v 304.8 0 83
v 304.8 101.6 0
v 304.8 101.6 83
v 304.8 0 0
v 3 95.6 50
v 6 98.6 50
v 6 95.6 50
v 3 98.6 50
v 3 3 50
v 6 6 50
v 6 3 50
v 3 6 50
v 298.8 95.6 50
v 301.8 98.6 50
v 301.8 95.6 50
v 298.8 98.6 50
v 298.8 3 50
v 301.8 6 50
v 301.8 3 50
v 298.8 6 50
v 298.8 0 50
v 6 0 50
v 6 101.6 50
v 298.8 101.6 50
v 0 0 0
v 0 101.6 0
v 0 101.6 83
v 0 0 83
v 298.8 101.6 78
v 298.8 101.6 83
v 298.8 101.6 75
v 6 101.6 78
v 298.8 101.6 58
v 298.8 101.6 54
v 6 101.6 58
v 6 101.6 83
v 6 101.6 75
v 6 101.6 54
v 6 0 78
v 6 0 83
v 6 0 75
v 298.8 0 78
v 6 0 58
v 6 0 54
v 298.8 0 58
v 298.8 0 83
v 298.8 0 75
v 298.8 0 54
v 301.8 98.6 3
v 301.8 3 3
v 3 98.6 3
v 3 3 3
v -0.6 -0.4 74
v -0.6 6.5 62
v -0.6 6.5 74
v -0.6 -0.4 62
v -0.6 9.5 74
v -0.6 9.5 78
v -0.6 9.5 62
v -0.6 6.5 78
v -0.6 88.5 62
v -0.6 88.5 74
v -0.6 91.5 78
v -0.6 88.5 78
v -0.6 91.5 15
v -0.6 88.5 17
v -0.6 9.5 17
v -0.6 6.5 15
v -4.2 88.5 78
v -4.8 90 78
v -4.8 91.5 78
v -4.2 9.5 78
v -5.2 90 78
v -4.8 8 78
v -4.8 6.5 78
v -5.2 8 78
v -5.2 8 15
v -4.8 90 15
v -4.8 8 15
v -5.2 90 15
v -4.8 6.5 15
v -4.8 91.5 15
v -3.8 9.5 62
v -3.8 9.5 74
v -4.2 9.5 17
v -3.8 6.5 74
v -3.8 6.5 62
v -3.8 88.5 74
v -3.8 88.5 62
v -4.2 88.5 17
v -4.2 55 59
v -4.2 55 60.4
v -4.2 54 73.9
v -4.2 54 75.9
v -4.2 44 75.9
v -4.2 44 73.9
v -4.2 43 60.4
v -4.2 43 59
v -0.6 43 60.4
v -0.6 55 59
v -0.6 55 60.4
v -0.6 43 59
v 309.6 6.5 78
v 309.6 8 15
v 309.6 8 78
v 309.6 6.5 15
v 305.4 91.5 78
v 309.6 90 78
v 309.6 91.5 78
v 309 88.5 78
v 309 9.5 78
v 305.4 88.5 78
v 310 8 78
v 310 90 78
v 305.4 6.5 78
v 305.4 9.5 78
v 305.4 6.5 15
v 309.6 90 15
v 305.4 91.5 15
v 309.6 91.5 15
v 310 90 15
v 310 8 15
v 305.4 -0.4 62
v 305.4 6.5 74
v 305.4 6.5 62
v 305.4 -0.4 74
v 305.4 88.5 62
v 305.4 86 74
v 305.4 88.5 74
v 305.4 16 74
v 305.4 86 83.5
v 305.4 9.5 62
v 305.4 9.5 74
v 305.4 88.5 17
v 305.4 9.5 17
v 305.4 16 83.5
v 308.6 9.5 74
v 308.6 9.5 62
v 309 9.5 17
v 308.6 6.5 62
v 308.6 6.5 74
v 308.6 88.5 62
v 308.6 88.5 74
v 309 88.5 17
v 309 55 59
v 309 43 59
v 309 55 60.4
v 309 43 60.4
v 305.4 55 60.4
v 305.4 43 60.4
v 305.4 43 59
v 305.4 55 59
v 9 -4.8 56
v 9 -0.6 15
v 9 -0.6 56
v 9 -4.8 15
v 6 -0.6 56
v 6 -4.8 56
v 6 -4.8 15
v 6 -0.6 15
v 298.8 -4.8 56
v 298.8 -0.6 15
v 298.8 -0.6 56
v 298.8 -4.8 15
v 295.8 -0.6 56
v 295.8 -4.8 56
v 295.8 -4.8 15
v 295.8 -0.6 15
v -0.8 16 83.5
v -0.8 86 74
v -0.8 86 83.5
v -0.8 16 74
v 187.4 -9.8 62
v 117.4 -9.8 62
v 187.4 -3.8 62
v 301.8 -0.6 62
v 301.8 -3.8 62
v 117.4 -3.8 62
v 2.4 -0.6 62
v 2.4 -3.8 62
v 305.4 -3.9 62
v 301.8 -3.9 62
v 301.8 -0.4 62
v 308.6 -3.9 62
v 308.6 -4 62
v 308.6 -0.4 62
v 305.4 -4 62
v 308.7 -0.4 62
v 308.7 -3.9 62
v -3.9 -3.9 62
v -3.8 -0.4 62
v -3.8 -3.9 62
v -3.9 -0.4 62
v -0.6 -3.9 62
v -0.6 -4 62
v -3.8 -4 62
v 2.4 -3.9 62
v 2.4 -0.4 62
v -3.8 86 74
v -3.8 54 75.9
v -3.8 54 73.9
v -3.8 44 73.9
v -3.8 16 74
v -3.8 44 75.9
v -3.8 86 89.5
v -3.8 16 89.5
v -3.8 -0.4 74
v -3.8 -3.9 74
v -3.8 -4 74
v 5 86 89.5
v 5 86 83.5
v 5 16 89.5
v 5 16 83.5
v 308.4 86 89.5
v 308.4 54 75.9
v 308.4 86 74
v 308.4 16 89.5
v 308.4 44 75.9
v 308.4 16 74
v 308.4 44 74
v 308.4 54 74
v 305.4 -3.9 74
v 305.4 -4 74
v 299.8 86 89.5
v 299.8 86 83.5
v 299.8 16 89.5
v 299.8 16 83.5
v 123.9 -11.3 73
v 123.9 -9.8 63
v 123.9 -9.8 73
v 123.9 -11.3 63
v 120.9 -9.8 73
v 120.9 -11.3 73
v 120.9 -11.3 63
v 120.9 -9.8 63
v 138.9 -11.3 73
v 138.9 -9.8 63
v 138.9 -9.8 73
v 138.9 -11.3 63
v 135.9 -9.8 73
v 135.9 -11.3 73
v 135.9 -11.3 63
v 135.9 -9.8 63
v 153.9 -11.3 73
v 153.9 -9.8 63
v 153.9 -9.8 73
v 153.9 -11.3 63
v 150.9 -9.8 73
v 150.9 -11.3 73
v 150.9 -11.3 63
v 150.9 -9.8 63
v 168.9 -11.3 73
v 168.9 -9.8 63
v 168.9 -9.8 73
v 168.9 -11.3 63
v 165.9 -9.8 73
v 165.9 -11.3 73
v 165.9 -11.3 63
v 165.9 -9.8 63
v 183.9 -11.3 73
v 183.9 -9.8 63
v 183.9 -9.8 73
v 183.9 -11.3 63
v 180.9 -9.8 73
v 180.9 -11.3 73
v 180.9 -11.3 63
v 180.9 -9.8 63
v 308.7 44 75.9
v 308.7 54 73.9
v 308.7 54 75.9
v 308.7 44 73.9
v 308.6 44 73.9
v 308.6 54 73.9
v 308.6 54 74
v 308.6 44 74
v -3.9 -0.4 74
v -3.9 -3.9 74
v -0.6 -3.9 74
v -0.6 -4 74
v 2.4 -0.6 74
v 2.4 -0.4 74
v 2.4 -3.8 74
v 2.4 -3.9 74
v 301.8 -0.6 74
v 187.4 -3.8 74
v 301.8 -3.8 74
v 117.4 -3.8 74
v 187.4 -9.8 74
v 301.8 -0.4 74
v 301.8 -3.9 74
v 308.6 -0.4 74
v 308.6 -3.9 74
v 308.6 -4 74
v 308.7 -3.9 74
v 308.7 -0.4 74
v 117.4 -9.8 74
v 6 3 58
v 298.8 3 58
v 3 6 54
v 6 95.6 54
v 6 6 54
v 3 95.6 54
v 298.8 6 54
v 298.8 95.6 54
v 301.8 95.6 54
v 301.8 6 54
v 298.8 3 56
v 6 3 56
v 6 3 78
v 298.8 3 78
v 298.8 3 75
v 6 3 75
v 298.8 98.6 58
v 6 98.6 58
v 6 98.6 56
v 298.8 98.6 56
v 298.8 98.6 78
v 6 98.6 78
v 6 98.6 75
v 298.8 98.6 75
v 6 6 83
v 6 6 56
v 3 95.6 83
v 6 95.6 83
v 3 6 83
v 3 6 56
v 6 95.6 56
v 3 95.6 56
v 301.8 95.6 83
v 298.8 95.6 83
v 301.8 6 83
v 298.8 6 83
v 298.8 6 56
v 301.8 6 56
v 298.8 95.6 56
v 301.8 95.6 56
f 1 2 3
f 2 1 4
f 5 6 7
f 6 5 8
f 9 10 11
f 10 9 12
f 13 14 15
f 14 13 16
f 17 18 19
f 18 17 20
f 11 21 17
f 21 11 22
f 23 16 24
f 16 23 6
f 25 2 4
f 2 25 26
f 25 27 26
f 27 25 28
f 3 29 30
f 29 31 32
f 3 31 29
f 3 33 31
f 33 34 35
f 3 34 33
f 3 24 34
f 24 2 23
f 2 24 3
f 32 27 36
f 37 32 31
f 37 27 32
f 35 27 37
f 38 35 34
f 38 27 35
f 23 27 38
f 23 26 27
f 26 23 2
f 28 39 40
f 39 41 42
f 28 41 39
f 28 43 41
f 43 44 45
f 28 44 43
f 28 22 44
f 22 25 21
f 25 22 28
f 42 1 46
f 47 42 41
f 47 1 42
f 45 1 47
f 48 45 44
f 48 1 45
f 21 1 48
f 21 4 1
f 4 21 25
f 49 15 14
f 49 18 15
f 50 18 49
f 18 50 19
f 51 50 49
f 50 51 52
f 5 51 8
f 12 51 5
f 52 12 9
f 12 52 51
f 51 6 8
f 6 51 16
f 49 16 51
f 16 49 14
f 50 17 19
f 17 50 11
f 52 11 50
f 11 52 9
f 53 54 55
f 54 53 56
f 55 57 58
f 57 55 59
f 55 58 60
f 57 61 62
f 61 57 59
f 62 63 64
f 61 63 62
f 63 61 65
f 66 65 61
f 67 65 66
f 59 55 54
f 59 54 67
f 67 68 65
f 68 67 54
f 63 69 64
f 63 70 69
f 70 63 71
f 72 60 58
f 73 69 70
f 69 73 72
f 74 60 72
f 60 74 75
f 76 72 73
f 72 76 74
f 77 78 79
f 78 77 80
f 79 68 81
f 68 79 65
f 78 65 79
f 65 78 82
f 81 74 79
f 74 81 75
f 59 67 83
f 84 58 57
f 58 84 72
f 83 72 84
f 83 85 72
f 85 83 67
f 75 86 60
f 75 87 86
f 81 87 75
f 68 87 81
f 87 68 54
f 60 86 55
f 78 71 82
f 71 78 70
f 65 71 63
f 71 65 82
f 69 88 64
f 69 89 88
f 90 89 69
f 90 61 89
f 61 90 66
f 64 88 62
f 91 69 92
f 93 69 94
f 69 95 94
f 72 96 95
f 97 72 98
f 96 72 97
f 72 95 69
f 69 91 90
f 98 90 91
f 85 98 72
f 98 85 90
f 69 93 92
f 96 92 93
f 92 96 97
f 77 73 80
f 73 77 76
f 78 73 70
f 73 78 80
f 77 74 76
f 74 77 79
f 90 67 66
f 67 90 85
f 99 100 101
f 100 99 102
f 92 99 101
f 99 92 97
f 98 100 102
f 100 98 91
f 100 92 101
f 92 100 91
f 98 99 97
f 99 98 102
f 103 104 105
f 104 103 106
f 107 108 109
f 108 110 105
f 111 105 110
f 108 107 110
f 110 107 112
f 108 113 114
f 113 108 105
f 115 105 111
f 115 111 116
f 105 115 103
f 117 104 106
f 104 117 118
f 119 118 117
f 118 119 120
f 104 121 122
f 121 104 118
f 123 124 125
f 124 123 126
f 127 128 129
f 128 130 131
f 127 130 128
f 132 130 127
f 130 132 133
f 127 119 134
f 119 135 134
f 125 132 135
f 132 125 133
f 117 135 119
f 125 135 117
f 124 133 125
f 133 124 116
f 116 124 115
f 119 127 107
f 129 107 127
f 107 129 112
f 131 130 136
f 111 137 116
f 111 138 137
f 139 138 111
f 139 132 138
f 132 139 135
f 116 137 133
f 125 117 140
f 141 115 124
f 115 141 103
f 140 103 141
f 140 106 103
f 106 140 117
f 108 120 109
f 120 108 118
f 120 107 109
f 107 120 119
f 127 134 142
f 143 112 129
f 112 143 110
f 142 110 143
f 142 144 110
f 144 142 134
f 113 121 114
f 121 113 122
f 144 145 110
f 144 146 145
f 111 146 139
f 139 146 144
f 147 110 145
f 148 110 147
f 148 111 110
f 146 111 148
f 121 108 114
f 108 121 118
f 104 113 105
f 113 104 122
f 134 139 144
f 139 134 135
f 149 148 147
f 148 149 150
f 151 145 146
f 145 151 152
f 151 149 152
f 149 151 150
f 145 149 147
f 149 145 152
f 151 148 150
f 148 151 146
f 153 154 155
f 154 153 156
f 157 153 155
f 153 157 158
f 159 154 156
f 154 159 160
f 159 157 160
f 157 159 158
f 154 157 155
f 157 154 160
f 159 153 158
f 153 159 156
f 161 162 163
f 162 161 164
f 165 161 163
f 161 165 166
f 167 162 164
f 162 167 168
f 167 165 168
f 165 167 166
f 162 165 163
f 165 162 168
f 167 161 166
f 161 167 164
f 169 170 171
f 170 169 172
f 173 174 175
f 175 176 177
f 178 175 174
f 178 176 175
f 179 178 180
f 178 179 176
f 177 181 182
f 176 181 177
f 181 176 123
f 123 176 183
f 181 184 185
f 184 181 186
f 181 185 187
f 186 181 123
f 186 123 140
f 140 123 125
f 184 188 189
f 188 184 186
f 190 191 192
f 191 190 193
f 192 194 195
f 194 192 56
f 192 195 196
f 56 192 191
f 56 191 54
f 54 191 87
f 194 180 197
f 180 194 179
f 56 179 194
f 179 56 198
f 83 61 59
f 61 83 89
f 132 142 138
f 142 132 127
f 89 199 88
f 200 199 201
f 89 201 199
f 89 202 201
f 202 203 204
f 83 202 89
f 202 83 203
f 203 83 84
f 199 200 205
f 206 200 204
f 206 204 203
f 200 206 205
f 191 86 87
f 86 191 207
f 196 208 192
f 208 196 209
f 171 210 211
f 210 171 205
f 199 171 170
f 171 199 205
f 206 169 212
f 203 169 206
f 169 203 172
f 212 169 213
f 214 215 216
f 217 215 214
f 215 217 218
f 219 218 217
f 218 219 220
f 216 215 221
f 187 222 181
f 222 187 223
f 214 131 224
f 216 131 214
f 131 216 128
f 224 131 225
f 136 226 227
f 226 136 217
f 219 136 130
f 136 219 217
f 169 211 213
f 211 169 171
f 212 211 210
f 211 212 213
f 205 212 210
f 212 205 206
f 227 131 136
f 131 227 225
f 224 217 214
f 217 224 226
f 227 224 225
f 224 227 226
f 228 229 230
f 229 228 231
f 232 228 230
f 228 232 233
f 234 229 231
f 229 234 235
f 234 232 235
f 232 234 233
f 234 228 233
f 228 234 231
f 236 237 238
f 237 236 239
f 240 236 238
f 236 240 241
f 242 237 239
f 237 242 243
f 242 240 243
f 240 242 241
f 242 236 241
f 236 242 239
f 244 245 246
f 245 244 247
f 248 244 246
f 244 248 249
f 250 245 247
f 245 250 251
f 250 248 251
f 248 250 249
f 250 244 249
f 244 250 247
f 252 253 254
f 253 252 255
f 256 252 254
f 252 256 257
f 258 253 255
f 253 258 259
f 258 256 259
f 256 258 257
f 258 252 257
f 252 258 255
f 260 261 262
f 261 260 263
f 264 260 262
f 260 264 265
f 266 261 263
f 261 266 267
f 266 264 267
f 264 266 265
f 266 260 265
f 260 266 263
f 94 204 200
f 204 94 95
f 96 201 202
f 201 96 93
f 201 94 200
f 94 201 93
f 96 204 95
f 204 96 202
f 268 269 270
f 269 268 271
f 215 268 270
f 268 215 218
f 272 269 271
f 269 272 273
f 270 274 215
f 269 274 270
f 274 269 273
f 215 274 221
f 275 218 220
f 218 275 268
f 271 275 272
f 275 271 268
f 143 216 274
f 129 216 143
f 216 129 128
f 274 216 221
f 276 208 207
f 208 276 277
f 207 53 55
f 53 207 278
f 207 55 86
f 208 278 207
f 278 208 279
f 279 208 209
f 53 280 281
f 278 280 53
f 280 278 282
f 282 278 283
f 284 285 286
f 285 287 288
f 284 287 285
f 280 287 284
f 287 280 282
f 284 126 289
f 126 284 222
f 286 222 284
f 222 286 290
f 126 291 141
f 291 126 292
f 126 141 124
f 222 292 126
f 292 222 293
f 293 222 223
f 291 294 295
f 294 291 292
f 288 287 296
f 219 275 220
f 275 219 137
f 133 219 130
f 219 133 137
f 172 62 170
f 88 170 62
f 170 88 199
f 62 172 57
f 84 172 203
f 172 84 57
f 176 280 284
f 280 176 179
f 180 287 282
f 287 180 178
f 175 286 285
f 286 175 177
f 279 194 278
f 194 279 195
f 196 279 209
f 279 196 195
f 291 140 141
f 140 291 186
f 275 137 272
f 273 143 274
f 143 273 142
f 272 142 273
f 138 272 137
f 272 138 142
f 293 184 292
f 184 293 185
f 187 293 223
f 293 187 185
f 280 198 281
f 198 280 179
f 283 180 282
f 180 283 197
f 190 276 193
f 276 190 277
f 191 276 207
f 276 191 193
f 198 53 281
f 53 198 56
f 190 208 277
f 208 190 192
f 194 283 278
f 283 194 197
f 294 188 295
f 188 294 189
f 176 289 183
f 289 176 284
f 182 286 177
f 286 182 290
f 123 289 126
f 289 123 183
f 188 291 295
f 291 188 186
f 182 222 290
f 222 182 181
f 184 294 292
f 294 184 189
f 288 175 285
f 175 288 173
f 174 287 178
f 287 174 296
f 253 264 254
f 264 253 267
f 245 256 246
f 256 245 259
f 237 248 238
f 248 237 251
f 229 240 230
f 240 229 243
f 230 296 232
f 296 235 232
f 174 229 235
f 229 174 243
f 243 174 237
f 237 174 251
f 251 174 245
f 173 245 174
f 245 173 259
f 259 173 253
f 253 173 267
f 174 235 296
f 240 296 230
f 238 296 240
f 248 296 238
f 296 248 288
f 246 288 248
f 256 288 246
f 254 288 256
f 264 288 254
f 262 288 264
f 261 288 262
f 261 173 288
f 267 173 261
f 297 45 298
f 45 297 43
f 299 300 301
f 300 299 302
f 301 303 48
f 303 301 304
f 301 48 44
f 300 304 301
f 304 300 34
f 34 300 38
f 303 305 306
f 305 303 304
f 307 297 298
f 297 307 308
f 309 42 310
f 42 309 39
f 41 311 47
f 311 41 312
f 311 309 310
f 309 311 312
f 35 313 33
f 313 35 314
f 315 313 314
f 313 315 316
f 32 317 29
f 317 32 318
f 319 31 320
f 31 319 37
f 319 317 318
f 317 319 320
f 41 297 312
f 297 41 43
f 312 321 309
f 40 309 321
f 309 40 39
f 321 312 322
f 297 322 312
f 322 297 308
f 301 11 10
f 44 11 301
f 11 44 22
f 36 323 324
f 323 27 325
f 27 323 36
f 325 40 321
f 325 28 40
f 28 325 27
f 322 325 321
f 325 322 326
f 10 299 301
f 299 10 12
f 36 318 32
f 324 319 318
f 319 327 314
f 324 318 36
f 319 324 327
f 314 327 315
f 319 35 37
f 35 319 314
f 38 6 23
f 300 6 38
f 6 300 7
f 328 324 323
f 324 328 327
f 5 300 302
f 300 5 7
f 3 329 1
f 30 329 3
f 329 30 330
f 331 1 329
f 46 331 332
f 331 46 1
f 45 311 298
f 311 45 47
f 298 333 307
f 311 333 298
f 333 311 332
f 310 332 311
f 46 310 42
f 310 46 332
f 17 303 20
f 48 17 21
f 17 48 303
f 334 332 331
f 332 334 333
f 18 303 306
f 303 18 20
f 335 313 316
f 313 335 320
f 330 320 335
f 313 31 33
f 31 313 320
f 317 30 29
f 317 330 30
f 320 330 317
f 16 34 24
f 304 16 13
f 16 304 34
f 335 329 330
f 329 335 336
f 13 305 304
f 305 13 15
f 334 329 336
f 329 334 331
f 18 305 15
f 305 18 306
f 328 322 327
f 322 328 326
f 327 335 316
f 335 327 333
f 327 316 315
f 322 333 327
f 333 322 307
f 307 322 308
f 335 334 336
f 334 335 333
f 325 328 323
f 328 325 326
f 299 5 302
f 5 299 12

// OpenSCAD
// file: ../top_ref.scad
// top_ref.scad  — FAITHFUL reference of the real uploaded top tray (L3.stl)
// Extracted from L3.stl by voxel analysis. Coordinates: new-tray top face = z=0 here,
// call top_ref(base=50) to seat it on a 50mm-tall new tray.
// DO NOT MODIFY THIS PART IN ANY DESIGN — it represents an already-printed tray.
//
// Real dims: 304.8 (X) x 101.6 (Y) x 33 (Z).
//  - END walls (short, x=0..3 and 301.8..304.8): SOLID full height -> top at z=33 (seated 83)
//  - LONG sides (front y=0..3, back y=98.6..101.6): OPEN FRAME
//        bottom rail z=4..8, top rail z=25..28, OPEN between (z=9..24)
//        side top edge at z=28 (seated 78)
//  - Corners: full height to z=33 (seated 83)
//  - Floor plate: z=4..6
// Seated mapping (base=50): add 50 to every z below.

TR_X = 304.8;
TR_Y = 101.6;
TR_Z = 33;
TR_wall = 3;        // side/end wall thickness
TR_endw = 3;        // short-end wall thickness
TR_botrail_z0 = 4;  TR_botrail_z1 = 8;     // long-side bottom rail
TR_toprail_z0 = 25; TR_toprail_z1 = 28;    // long-side top rail (side top edge=28)
TR_floor_z0 = 4;    TR_floor_z1 = 6;
TR_corner = 6;      // corner post footprint (x & y) kept full height

module top_ref(base=50, col="#90A4AE", alpha=1.0) {
    color(col, alpha)
    translate([0,0,base])
    union() {
        // ---- floor plate ----
        translate([TR_endw, TR_wall, TR_floor_z0])
            cube([TR_X-2*TR_endw, TR_Y-2*TR_wall, TR_floor_z1-TR_floor_z0]);
        // ---- two short END walls: full height ----
        cube([TR_endw, TR_Y, TR_Z]);
        translate([TR_X-TR_endw,0,0]) cube([TR_endw, TR_Y, TR_Z]);
        // ---- long-side OPEN FRAMES (front & back) ----
        for (yy=[0, TR_Y-TR_wall]) {
            // bottom rail
            translate([0, yy, TR_botrail_z0]) cube([TR_X, TR_wall, TR_botrail_z1-TR_botrail_z0]);
            // top rail (side top edge)
            translate([0, yy, TR_toprail_z0]) cube([TR_X, TR_wall, TR_toprail_z1-TR_toprail_z0]);
        }
        // ---- corner posts full height (tie frames together, reach z=33) ----
        for (xx=[0, TR_X-TR_corner], yy=[0, TR_Y-TR_corner])
            translate([xx,yy,0]) cube([TR_corner, TR_corner, TR_Z]);
    }
}

// Convenience constants a design can reference (seated, base=50):
//   END-wall top edge:        z = 50+33 = 83  (over the short ends -> strong clamp)
//   Long-side top rail top:   z = 50+28 = 78  (hook over / under along front)
//   Long-side open slot:      z = 50+9 .. 50+24 = 59..74 (reach a tongue in anywhere)
//   Corner top:               z = 83
// main file
// spine_final.scad — FINALIZED "lift-&-click" spine lock (design #2)
// Correct kinematics: end hooks ride UP the OUTSIDE of the top-tray end walls
// (clear of them) and cam/snap INWARD over the wall tops only at the very top of
// the lift. One rigid U-carriage (front handle + 2 side rails + 2 end hooks).
// Purely ADDITIVE guide rails on the tray FRONT + END exterior faces (no cuts →
// existing groove untouched). Back (fridge-door) side stays flush.
//
// show = all | new | top | carriage | guides | tray
// pose = 0 (stowed/unlocked) .. 1 (locked).

show = "all";
pose = 1;
lock = pose;
tray_src = "box";   // "box" = parametric test tray; "stl" = real layer (best/layer_real.stl)

include <../top_ref.scad>
$fn = 40;

NTX=304.8; NTY=101.6; NTZ=50; WALL=3;
ENDTOP=83; GAP=0.6; TRAVEL=44;
BAR_T=3.2; BARH=12; BASE_Z=18;     // U-rail cross-section + stow base z
STEM_T=3.0; STEM_W=70; HOOK_Y0=16;
NOSE_IN=5; NOSE_H=6;
NOSE_BOT_STOW=39.5;                // +TRAVEL = 83.5 locked (0.5mm over the z=83 wall top)
GY0=8; GY1=90; GUIDE_Z0=15; GUIDE_Z1=78;

zoff = pose*TRAVEL;
flex = pose>0.95 ? (pose-0.95)/0.05 : 0;       // cam-in only in the last 5% of travel
nose_r = -GAP + flex*(NOSE_IN+GAP);            // nose inner edge x: out(-GAP) -> in(+NOSE_IN)

function railx(side) = side==0 ? -(GAP+BAR_T) : NTX+GAP;   // U side-rail / stem outer face
function noser(side) = side==0 ? nose_r : NTX-nose_r;

C_NEW="#1565C0"; C_GD="#F9A825"; C_CAR="#D84315";

// ---- TRAY: parametric box for testing, or the REAL layer STL (additive only) ----
module tray() {
    color(C_NEW)
    if (tray_src=="stl") import("layer_real.stl");
    else difference(){
        cube([NTX,NTY,NTZ]);
        translate([WALL,WALL,WALL]) cube([NTX-2*WALL,NTY-2*WALL,NTZ]);
    }
}

// ---- ADDITIVE GUIDES (fixed, all hardware kept clear of the wall: |x| ≥ GAP) ----
module end_guide(side){
    rx = railx(side);                 // rail outer face (left: -3.8)
    inner = side==0 ? -GAP : NTX+GAP; // closest the guide may come to the end face
    // two ribs straddling the rail in Y (slide track) — span only the rail zone
    color(C_GD){
        x0 = side==0 ? rx-1.0 : inner;          // keep within x<0 (or x>NTX)
        w  = (BAR_T+1.0);
        for(y=[GY0,GY1]) translate([x0, y-1.5, GUIDE_Z0]) cube([w, 3, GUIDE_Z1-GUIDE_Z0]);
        // outer retaining lip (overhangs rail outer face, captures it in X)
        lipx = side==0 ? rx-1.4 : rx+BAR_T+0.4;
        translate([lipx, GY0, GUIDE_Z0]) cube([1.0, GY1-GY0, GUIDE_Z1-GUIDE_Z0]);
        // bottom stop
        translate([x0, GY0, GUIDE_Z0]) cube([w, GY1-GY0, 2]);
        // detent nub near locked height (rail bump clicks past)
        translate([x0, (GY0+GY1)/2-6, GUIDE_Z0+TRAVEL]) cube([w,12,1.4]);
    }
}
module front_guide(){
    by=-(GAP+BAR_T);
    color(C_GD) for(x=[6,NTX-9]) translate([x,by-1.0,GUIDE_Z0]) cube([3,BAR_T+1.0,GUIDE_Z1-GUIDE_Z0-22]);
}
module guides(){ end_guide(0); end_guide(1); front_guide(); }

// ---- CARRIAGE (one rigid body; all joints overlap ≥1mm) ----
module hook(side){
    sx = railx(side);
    nr = noser(side);
    // stem (thin cantilever)
    translate([sx, HOOK_Y0, BASE_Z+BARH-0.1])
        cube([STEM_T, STEM_W, NOSE_BOT_STOW-(BASE_Z+BARH)+0.1]);
    // nose: from stem outer face inward to nose_r
    nx0 = min(sx, side==0?nr:sx);
    lo = side==0 ? sx : min(sx, nr);
    hi = side==0 ? max(sx+STEM_T, nr) : sx+STEM_T;
    translate([lo, HOOK_Y0, NOSE_BOT_STOW]) cube([hi-lo, STEM_W, NOSE_H]);
}
module carriage(){
    translate([0,0,zoff]) color(C_CAR){
        // front bar
        translate([2,-(GAP+BAR_T),BASE_Z]) cube([NTX-4,BAR_T,BARH]);
        // side rails (start in front-corner zone for overlap with joiner)
        translate([railx(0),-4,BASE_Z]) cube([BAR_T,95,BARH]);
        translate([railx(1),-4,BASE_Z]) cube([BAR_T,95,BARH]);
        // front corner joiners — stay entirely in the EXTERIOR corner (y<0) so they
        // never enter the top-tray footprint; bridge side rail <-> front bar in X.
        translate([railx(0)-0.1,-(GAP+BAR_T)-0.1,BASE_Z]) cube([BAR_T+0.1+3, BAR_T+GAP+0.1-0.4, BARH]);
        translate([NTX-3, -(GAP+BAR_T)-0.1,BASE_Z])       cube([railx(1)+BAR_T-(NTX-3)+0.1, BAR_T+GAP+0.1-0.4, BARH]);
        // stem bases (bridge rail -> hook), overlap into rail
        for(side=[0,1]) translate([railx(side),HOOK_Y0,BASE_Z]) cube([STEM_T,STEM_W,BARH+0.2]);
        // hooks
        hook(0); hook(1);
        // handle grip on front bar (with integral grip ridges on its own front face)
        translate([NTX/2-35,-(GAP+BAR_T)-6,BASE_Z]) cube([70,6.1,BARH]);
        for(rx=[-30:15:30]) translate([NTX/2+rx-1.5,-(GAP+BAR_T)-7.5,BASE_Z+1]) cube([3,2.1,BARH-2]);
        // detent bumps on side rails (click past the guide nub)
        for(side=[0,1]){ ox = side==0 ? railx(0)-0.5 : railx(1)+BAR_T-0.5;
            translate([ox,(GY0+GY1)/2-5,BASE_Z+BARH-0.1]) cube([0.6,10,2]); }
    }
}

if (show=="new")           { tray(); guides(); carriage(); }
else if (show=="carriage")   carriage();
else if (show=="guides")     guides();
else if (show=="tray")       tray();
else if (show=="lock_layer"){ tray(); guides(); }   // the printable layer-with-lock
else if (show=="top")        top_ref(50);
else { tray(); guides(); carriage(); top_ref(50); }
